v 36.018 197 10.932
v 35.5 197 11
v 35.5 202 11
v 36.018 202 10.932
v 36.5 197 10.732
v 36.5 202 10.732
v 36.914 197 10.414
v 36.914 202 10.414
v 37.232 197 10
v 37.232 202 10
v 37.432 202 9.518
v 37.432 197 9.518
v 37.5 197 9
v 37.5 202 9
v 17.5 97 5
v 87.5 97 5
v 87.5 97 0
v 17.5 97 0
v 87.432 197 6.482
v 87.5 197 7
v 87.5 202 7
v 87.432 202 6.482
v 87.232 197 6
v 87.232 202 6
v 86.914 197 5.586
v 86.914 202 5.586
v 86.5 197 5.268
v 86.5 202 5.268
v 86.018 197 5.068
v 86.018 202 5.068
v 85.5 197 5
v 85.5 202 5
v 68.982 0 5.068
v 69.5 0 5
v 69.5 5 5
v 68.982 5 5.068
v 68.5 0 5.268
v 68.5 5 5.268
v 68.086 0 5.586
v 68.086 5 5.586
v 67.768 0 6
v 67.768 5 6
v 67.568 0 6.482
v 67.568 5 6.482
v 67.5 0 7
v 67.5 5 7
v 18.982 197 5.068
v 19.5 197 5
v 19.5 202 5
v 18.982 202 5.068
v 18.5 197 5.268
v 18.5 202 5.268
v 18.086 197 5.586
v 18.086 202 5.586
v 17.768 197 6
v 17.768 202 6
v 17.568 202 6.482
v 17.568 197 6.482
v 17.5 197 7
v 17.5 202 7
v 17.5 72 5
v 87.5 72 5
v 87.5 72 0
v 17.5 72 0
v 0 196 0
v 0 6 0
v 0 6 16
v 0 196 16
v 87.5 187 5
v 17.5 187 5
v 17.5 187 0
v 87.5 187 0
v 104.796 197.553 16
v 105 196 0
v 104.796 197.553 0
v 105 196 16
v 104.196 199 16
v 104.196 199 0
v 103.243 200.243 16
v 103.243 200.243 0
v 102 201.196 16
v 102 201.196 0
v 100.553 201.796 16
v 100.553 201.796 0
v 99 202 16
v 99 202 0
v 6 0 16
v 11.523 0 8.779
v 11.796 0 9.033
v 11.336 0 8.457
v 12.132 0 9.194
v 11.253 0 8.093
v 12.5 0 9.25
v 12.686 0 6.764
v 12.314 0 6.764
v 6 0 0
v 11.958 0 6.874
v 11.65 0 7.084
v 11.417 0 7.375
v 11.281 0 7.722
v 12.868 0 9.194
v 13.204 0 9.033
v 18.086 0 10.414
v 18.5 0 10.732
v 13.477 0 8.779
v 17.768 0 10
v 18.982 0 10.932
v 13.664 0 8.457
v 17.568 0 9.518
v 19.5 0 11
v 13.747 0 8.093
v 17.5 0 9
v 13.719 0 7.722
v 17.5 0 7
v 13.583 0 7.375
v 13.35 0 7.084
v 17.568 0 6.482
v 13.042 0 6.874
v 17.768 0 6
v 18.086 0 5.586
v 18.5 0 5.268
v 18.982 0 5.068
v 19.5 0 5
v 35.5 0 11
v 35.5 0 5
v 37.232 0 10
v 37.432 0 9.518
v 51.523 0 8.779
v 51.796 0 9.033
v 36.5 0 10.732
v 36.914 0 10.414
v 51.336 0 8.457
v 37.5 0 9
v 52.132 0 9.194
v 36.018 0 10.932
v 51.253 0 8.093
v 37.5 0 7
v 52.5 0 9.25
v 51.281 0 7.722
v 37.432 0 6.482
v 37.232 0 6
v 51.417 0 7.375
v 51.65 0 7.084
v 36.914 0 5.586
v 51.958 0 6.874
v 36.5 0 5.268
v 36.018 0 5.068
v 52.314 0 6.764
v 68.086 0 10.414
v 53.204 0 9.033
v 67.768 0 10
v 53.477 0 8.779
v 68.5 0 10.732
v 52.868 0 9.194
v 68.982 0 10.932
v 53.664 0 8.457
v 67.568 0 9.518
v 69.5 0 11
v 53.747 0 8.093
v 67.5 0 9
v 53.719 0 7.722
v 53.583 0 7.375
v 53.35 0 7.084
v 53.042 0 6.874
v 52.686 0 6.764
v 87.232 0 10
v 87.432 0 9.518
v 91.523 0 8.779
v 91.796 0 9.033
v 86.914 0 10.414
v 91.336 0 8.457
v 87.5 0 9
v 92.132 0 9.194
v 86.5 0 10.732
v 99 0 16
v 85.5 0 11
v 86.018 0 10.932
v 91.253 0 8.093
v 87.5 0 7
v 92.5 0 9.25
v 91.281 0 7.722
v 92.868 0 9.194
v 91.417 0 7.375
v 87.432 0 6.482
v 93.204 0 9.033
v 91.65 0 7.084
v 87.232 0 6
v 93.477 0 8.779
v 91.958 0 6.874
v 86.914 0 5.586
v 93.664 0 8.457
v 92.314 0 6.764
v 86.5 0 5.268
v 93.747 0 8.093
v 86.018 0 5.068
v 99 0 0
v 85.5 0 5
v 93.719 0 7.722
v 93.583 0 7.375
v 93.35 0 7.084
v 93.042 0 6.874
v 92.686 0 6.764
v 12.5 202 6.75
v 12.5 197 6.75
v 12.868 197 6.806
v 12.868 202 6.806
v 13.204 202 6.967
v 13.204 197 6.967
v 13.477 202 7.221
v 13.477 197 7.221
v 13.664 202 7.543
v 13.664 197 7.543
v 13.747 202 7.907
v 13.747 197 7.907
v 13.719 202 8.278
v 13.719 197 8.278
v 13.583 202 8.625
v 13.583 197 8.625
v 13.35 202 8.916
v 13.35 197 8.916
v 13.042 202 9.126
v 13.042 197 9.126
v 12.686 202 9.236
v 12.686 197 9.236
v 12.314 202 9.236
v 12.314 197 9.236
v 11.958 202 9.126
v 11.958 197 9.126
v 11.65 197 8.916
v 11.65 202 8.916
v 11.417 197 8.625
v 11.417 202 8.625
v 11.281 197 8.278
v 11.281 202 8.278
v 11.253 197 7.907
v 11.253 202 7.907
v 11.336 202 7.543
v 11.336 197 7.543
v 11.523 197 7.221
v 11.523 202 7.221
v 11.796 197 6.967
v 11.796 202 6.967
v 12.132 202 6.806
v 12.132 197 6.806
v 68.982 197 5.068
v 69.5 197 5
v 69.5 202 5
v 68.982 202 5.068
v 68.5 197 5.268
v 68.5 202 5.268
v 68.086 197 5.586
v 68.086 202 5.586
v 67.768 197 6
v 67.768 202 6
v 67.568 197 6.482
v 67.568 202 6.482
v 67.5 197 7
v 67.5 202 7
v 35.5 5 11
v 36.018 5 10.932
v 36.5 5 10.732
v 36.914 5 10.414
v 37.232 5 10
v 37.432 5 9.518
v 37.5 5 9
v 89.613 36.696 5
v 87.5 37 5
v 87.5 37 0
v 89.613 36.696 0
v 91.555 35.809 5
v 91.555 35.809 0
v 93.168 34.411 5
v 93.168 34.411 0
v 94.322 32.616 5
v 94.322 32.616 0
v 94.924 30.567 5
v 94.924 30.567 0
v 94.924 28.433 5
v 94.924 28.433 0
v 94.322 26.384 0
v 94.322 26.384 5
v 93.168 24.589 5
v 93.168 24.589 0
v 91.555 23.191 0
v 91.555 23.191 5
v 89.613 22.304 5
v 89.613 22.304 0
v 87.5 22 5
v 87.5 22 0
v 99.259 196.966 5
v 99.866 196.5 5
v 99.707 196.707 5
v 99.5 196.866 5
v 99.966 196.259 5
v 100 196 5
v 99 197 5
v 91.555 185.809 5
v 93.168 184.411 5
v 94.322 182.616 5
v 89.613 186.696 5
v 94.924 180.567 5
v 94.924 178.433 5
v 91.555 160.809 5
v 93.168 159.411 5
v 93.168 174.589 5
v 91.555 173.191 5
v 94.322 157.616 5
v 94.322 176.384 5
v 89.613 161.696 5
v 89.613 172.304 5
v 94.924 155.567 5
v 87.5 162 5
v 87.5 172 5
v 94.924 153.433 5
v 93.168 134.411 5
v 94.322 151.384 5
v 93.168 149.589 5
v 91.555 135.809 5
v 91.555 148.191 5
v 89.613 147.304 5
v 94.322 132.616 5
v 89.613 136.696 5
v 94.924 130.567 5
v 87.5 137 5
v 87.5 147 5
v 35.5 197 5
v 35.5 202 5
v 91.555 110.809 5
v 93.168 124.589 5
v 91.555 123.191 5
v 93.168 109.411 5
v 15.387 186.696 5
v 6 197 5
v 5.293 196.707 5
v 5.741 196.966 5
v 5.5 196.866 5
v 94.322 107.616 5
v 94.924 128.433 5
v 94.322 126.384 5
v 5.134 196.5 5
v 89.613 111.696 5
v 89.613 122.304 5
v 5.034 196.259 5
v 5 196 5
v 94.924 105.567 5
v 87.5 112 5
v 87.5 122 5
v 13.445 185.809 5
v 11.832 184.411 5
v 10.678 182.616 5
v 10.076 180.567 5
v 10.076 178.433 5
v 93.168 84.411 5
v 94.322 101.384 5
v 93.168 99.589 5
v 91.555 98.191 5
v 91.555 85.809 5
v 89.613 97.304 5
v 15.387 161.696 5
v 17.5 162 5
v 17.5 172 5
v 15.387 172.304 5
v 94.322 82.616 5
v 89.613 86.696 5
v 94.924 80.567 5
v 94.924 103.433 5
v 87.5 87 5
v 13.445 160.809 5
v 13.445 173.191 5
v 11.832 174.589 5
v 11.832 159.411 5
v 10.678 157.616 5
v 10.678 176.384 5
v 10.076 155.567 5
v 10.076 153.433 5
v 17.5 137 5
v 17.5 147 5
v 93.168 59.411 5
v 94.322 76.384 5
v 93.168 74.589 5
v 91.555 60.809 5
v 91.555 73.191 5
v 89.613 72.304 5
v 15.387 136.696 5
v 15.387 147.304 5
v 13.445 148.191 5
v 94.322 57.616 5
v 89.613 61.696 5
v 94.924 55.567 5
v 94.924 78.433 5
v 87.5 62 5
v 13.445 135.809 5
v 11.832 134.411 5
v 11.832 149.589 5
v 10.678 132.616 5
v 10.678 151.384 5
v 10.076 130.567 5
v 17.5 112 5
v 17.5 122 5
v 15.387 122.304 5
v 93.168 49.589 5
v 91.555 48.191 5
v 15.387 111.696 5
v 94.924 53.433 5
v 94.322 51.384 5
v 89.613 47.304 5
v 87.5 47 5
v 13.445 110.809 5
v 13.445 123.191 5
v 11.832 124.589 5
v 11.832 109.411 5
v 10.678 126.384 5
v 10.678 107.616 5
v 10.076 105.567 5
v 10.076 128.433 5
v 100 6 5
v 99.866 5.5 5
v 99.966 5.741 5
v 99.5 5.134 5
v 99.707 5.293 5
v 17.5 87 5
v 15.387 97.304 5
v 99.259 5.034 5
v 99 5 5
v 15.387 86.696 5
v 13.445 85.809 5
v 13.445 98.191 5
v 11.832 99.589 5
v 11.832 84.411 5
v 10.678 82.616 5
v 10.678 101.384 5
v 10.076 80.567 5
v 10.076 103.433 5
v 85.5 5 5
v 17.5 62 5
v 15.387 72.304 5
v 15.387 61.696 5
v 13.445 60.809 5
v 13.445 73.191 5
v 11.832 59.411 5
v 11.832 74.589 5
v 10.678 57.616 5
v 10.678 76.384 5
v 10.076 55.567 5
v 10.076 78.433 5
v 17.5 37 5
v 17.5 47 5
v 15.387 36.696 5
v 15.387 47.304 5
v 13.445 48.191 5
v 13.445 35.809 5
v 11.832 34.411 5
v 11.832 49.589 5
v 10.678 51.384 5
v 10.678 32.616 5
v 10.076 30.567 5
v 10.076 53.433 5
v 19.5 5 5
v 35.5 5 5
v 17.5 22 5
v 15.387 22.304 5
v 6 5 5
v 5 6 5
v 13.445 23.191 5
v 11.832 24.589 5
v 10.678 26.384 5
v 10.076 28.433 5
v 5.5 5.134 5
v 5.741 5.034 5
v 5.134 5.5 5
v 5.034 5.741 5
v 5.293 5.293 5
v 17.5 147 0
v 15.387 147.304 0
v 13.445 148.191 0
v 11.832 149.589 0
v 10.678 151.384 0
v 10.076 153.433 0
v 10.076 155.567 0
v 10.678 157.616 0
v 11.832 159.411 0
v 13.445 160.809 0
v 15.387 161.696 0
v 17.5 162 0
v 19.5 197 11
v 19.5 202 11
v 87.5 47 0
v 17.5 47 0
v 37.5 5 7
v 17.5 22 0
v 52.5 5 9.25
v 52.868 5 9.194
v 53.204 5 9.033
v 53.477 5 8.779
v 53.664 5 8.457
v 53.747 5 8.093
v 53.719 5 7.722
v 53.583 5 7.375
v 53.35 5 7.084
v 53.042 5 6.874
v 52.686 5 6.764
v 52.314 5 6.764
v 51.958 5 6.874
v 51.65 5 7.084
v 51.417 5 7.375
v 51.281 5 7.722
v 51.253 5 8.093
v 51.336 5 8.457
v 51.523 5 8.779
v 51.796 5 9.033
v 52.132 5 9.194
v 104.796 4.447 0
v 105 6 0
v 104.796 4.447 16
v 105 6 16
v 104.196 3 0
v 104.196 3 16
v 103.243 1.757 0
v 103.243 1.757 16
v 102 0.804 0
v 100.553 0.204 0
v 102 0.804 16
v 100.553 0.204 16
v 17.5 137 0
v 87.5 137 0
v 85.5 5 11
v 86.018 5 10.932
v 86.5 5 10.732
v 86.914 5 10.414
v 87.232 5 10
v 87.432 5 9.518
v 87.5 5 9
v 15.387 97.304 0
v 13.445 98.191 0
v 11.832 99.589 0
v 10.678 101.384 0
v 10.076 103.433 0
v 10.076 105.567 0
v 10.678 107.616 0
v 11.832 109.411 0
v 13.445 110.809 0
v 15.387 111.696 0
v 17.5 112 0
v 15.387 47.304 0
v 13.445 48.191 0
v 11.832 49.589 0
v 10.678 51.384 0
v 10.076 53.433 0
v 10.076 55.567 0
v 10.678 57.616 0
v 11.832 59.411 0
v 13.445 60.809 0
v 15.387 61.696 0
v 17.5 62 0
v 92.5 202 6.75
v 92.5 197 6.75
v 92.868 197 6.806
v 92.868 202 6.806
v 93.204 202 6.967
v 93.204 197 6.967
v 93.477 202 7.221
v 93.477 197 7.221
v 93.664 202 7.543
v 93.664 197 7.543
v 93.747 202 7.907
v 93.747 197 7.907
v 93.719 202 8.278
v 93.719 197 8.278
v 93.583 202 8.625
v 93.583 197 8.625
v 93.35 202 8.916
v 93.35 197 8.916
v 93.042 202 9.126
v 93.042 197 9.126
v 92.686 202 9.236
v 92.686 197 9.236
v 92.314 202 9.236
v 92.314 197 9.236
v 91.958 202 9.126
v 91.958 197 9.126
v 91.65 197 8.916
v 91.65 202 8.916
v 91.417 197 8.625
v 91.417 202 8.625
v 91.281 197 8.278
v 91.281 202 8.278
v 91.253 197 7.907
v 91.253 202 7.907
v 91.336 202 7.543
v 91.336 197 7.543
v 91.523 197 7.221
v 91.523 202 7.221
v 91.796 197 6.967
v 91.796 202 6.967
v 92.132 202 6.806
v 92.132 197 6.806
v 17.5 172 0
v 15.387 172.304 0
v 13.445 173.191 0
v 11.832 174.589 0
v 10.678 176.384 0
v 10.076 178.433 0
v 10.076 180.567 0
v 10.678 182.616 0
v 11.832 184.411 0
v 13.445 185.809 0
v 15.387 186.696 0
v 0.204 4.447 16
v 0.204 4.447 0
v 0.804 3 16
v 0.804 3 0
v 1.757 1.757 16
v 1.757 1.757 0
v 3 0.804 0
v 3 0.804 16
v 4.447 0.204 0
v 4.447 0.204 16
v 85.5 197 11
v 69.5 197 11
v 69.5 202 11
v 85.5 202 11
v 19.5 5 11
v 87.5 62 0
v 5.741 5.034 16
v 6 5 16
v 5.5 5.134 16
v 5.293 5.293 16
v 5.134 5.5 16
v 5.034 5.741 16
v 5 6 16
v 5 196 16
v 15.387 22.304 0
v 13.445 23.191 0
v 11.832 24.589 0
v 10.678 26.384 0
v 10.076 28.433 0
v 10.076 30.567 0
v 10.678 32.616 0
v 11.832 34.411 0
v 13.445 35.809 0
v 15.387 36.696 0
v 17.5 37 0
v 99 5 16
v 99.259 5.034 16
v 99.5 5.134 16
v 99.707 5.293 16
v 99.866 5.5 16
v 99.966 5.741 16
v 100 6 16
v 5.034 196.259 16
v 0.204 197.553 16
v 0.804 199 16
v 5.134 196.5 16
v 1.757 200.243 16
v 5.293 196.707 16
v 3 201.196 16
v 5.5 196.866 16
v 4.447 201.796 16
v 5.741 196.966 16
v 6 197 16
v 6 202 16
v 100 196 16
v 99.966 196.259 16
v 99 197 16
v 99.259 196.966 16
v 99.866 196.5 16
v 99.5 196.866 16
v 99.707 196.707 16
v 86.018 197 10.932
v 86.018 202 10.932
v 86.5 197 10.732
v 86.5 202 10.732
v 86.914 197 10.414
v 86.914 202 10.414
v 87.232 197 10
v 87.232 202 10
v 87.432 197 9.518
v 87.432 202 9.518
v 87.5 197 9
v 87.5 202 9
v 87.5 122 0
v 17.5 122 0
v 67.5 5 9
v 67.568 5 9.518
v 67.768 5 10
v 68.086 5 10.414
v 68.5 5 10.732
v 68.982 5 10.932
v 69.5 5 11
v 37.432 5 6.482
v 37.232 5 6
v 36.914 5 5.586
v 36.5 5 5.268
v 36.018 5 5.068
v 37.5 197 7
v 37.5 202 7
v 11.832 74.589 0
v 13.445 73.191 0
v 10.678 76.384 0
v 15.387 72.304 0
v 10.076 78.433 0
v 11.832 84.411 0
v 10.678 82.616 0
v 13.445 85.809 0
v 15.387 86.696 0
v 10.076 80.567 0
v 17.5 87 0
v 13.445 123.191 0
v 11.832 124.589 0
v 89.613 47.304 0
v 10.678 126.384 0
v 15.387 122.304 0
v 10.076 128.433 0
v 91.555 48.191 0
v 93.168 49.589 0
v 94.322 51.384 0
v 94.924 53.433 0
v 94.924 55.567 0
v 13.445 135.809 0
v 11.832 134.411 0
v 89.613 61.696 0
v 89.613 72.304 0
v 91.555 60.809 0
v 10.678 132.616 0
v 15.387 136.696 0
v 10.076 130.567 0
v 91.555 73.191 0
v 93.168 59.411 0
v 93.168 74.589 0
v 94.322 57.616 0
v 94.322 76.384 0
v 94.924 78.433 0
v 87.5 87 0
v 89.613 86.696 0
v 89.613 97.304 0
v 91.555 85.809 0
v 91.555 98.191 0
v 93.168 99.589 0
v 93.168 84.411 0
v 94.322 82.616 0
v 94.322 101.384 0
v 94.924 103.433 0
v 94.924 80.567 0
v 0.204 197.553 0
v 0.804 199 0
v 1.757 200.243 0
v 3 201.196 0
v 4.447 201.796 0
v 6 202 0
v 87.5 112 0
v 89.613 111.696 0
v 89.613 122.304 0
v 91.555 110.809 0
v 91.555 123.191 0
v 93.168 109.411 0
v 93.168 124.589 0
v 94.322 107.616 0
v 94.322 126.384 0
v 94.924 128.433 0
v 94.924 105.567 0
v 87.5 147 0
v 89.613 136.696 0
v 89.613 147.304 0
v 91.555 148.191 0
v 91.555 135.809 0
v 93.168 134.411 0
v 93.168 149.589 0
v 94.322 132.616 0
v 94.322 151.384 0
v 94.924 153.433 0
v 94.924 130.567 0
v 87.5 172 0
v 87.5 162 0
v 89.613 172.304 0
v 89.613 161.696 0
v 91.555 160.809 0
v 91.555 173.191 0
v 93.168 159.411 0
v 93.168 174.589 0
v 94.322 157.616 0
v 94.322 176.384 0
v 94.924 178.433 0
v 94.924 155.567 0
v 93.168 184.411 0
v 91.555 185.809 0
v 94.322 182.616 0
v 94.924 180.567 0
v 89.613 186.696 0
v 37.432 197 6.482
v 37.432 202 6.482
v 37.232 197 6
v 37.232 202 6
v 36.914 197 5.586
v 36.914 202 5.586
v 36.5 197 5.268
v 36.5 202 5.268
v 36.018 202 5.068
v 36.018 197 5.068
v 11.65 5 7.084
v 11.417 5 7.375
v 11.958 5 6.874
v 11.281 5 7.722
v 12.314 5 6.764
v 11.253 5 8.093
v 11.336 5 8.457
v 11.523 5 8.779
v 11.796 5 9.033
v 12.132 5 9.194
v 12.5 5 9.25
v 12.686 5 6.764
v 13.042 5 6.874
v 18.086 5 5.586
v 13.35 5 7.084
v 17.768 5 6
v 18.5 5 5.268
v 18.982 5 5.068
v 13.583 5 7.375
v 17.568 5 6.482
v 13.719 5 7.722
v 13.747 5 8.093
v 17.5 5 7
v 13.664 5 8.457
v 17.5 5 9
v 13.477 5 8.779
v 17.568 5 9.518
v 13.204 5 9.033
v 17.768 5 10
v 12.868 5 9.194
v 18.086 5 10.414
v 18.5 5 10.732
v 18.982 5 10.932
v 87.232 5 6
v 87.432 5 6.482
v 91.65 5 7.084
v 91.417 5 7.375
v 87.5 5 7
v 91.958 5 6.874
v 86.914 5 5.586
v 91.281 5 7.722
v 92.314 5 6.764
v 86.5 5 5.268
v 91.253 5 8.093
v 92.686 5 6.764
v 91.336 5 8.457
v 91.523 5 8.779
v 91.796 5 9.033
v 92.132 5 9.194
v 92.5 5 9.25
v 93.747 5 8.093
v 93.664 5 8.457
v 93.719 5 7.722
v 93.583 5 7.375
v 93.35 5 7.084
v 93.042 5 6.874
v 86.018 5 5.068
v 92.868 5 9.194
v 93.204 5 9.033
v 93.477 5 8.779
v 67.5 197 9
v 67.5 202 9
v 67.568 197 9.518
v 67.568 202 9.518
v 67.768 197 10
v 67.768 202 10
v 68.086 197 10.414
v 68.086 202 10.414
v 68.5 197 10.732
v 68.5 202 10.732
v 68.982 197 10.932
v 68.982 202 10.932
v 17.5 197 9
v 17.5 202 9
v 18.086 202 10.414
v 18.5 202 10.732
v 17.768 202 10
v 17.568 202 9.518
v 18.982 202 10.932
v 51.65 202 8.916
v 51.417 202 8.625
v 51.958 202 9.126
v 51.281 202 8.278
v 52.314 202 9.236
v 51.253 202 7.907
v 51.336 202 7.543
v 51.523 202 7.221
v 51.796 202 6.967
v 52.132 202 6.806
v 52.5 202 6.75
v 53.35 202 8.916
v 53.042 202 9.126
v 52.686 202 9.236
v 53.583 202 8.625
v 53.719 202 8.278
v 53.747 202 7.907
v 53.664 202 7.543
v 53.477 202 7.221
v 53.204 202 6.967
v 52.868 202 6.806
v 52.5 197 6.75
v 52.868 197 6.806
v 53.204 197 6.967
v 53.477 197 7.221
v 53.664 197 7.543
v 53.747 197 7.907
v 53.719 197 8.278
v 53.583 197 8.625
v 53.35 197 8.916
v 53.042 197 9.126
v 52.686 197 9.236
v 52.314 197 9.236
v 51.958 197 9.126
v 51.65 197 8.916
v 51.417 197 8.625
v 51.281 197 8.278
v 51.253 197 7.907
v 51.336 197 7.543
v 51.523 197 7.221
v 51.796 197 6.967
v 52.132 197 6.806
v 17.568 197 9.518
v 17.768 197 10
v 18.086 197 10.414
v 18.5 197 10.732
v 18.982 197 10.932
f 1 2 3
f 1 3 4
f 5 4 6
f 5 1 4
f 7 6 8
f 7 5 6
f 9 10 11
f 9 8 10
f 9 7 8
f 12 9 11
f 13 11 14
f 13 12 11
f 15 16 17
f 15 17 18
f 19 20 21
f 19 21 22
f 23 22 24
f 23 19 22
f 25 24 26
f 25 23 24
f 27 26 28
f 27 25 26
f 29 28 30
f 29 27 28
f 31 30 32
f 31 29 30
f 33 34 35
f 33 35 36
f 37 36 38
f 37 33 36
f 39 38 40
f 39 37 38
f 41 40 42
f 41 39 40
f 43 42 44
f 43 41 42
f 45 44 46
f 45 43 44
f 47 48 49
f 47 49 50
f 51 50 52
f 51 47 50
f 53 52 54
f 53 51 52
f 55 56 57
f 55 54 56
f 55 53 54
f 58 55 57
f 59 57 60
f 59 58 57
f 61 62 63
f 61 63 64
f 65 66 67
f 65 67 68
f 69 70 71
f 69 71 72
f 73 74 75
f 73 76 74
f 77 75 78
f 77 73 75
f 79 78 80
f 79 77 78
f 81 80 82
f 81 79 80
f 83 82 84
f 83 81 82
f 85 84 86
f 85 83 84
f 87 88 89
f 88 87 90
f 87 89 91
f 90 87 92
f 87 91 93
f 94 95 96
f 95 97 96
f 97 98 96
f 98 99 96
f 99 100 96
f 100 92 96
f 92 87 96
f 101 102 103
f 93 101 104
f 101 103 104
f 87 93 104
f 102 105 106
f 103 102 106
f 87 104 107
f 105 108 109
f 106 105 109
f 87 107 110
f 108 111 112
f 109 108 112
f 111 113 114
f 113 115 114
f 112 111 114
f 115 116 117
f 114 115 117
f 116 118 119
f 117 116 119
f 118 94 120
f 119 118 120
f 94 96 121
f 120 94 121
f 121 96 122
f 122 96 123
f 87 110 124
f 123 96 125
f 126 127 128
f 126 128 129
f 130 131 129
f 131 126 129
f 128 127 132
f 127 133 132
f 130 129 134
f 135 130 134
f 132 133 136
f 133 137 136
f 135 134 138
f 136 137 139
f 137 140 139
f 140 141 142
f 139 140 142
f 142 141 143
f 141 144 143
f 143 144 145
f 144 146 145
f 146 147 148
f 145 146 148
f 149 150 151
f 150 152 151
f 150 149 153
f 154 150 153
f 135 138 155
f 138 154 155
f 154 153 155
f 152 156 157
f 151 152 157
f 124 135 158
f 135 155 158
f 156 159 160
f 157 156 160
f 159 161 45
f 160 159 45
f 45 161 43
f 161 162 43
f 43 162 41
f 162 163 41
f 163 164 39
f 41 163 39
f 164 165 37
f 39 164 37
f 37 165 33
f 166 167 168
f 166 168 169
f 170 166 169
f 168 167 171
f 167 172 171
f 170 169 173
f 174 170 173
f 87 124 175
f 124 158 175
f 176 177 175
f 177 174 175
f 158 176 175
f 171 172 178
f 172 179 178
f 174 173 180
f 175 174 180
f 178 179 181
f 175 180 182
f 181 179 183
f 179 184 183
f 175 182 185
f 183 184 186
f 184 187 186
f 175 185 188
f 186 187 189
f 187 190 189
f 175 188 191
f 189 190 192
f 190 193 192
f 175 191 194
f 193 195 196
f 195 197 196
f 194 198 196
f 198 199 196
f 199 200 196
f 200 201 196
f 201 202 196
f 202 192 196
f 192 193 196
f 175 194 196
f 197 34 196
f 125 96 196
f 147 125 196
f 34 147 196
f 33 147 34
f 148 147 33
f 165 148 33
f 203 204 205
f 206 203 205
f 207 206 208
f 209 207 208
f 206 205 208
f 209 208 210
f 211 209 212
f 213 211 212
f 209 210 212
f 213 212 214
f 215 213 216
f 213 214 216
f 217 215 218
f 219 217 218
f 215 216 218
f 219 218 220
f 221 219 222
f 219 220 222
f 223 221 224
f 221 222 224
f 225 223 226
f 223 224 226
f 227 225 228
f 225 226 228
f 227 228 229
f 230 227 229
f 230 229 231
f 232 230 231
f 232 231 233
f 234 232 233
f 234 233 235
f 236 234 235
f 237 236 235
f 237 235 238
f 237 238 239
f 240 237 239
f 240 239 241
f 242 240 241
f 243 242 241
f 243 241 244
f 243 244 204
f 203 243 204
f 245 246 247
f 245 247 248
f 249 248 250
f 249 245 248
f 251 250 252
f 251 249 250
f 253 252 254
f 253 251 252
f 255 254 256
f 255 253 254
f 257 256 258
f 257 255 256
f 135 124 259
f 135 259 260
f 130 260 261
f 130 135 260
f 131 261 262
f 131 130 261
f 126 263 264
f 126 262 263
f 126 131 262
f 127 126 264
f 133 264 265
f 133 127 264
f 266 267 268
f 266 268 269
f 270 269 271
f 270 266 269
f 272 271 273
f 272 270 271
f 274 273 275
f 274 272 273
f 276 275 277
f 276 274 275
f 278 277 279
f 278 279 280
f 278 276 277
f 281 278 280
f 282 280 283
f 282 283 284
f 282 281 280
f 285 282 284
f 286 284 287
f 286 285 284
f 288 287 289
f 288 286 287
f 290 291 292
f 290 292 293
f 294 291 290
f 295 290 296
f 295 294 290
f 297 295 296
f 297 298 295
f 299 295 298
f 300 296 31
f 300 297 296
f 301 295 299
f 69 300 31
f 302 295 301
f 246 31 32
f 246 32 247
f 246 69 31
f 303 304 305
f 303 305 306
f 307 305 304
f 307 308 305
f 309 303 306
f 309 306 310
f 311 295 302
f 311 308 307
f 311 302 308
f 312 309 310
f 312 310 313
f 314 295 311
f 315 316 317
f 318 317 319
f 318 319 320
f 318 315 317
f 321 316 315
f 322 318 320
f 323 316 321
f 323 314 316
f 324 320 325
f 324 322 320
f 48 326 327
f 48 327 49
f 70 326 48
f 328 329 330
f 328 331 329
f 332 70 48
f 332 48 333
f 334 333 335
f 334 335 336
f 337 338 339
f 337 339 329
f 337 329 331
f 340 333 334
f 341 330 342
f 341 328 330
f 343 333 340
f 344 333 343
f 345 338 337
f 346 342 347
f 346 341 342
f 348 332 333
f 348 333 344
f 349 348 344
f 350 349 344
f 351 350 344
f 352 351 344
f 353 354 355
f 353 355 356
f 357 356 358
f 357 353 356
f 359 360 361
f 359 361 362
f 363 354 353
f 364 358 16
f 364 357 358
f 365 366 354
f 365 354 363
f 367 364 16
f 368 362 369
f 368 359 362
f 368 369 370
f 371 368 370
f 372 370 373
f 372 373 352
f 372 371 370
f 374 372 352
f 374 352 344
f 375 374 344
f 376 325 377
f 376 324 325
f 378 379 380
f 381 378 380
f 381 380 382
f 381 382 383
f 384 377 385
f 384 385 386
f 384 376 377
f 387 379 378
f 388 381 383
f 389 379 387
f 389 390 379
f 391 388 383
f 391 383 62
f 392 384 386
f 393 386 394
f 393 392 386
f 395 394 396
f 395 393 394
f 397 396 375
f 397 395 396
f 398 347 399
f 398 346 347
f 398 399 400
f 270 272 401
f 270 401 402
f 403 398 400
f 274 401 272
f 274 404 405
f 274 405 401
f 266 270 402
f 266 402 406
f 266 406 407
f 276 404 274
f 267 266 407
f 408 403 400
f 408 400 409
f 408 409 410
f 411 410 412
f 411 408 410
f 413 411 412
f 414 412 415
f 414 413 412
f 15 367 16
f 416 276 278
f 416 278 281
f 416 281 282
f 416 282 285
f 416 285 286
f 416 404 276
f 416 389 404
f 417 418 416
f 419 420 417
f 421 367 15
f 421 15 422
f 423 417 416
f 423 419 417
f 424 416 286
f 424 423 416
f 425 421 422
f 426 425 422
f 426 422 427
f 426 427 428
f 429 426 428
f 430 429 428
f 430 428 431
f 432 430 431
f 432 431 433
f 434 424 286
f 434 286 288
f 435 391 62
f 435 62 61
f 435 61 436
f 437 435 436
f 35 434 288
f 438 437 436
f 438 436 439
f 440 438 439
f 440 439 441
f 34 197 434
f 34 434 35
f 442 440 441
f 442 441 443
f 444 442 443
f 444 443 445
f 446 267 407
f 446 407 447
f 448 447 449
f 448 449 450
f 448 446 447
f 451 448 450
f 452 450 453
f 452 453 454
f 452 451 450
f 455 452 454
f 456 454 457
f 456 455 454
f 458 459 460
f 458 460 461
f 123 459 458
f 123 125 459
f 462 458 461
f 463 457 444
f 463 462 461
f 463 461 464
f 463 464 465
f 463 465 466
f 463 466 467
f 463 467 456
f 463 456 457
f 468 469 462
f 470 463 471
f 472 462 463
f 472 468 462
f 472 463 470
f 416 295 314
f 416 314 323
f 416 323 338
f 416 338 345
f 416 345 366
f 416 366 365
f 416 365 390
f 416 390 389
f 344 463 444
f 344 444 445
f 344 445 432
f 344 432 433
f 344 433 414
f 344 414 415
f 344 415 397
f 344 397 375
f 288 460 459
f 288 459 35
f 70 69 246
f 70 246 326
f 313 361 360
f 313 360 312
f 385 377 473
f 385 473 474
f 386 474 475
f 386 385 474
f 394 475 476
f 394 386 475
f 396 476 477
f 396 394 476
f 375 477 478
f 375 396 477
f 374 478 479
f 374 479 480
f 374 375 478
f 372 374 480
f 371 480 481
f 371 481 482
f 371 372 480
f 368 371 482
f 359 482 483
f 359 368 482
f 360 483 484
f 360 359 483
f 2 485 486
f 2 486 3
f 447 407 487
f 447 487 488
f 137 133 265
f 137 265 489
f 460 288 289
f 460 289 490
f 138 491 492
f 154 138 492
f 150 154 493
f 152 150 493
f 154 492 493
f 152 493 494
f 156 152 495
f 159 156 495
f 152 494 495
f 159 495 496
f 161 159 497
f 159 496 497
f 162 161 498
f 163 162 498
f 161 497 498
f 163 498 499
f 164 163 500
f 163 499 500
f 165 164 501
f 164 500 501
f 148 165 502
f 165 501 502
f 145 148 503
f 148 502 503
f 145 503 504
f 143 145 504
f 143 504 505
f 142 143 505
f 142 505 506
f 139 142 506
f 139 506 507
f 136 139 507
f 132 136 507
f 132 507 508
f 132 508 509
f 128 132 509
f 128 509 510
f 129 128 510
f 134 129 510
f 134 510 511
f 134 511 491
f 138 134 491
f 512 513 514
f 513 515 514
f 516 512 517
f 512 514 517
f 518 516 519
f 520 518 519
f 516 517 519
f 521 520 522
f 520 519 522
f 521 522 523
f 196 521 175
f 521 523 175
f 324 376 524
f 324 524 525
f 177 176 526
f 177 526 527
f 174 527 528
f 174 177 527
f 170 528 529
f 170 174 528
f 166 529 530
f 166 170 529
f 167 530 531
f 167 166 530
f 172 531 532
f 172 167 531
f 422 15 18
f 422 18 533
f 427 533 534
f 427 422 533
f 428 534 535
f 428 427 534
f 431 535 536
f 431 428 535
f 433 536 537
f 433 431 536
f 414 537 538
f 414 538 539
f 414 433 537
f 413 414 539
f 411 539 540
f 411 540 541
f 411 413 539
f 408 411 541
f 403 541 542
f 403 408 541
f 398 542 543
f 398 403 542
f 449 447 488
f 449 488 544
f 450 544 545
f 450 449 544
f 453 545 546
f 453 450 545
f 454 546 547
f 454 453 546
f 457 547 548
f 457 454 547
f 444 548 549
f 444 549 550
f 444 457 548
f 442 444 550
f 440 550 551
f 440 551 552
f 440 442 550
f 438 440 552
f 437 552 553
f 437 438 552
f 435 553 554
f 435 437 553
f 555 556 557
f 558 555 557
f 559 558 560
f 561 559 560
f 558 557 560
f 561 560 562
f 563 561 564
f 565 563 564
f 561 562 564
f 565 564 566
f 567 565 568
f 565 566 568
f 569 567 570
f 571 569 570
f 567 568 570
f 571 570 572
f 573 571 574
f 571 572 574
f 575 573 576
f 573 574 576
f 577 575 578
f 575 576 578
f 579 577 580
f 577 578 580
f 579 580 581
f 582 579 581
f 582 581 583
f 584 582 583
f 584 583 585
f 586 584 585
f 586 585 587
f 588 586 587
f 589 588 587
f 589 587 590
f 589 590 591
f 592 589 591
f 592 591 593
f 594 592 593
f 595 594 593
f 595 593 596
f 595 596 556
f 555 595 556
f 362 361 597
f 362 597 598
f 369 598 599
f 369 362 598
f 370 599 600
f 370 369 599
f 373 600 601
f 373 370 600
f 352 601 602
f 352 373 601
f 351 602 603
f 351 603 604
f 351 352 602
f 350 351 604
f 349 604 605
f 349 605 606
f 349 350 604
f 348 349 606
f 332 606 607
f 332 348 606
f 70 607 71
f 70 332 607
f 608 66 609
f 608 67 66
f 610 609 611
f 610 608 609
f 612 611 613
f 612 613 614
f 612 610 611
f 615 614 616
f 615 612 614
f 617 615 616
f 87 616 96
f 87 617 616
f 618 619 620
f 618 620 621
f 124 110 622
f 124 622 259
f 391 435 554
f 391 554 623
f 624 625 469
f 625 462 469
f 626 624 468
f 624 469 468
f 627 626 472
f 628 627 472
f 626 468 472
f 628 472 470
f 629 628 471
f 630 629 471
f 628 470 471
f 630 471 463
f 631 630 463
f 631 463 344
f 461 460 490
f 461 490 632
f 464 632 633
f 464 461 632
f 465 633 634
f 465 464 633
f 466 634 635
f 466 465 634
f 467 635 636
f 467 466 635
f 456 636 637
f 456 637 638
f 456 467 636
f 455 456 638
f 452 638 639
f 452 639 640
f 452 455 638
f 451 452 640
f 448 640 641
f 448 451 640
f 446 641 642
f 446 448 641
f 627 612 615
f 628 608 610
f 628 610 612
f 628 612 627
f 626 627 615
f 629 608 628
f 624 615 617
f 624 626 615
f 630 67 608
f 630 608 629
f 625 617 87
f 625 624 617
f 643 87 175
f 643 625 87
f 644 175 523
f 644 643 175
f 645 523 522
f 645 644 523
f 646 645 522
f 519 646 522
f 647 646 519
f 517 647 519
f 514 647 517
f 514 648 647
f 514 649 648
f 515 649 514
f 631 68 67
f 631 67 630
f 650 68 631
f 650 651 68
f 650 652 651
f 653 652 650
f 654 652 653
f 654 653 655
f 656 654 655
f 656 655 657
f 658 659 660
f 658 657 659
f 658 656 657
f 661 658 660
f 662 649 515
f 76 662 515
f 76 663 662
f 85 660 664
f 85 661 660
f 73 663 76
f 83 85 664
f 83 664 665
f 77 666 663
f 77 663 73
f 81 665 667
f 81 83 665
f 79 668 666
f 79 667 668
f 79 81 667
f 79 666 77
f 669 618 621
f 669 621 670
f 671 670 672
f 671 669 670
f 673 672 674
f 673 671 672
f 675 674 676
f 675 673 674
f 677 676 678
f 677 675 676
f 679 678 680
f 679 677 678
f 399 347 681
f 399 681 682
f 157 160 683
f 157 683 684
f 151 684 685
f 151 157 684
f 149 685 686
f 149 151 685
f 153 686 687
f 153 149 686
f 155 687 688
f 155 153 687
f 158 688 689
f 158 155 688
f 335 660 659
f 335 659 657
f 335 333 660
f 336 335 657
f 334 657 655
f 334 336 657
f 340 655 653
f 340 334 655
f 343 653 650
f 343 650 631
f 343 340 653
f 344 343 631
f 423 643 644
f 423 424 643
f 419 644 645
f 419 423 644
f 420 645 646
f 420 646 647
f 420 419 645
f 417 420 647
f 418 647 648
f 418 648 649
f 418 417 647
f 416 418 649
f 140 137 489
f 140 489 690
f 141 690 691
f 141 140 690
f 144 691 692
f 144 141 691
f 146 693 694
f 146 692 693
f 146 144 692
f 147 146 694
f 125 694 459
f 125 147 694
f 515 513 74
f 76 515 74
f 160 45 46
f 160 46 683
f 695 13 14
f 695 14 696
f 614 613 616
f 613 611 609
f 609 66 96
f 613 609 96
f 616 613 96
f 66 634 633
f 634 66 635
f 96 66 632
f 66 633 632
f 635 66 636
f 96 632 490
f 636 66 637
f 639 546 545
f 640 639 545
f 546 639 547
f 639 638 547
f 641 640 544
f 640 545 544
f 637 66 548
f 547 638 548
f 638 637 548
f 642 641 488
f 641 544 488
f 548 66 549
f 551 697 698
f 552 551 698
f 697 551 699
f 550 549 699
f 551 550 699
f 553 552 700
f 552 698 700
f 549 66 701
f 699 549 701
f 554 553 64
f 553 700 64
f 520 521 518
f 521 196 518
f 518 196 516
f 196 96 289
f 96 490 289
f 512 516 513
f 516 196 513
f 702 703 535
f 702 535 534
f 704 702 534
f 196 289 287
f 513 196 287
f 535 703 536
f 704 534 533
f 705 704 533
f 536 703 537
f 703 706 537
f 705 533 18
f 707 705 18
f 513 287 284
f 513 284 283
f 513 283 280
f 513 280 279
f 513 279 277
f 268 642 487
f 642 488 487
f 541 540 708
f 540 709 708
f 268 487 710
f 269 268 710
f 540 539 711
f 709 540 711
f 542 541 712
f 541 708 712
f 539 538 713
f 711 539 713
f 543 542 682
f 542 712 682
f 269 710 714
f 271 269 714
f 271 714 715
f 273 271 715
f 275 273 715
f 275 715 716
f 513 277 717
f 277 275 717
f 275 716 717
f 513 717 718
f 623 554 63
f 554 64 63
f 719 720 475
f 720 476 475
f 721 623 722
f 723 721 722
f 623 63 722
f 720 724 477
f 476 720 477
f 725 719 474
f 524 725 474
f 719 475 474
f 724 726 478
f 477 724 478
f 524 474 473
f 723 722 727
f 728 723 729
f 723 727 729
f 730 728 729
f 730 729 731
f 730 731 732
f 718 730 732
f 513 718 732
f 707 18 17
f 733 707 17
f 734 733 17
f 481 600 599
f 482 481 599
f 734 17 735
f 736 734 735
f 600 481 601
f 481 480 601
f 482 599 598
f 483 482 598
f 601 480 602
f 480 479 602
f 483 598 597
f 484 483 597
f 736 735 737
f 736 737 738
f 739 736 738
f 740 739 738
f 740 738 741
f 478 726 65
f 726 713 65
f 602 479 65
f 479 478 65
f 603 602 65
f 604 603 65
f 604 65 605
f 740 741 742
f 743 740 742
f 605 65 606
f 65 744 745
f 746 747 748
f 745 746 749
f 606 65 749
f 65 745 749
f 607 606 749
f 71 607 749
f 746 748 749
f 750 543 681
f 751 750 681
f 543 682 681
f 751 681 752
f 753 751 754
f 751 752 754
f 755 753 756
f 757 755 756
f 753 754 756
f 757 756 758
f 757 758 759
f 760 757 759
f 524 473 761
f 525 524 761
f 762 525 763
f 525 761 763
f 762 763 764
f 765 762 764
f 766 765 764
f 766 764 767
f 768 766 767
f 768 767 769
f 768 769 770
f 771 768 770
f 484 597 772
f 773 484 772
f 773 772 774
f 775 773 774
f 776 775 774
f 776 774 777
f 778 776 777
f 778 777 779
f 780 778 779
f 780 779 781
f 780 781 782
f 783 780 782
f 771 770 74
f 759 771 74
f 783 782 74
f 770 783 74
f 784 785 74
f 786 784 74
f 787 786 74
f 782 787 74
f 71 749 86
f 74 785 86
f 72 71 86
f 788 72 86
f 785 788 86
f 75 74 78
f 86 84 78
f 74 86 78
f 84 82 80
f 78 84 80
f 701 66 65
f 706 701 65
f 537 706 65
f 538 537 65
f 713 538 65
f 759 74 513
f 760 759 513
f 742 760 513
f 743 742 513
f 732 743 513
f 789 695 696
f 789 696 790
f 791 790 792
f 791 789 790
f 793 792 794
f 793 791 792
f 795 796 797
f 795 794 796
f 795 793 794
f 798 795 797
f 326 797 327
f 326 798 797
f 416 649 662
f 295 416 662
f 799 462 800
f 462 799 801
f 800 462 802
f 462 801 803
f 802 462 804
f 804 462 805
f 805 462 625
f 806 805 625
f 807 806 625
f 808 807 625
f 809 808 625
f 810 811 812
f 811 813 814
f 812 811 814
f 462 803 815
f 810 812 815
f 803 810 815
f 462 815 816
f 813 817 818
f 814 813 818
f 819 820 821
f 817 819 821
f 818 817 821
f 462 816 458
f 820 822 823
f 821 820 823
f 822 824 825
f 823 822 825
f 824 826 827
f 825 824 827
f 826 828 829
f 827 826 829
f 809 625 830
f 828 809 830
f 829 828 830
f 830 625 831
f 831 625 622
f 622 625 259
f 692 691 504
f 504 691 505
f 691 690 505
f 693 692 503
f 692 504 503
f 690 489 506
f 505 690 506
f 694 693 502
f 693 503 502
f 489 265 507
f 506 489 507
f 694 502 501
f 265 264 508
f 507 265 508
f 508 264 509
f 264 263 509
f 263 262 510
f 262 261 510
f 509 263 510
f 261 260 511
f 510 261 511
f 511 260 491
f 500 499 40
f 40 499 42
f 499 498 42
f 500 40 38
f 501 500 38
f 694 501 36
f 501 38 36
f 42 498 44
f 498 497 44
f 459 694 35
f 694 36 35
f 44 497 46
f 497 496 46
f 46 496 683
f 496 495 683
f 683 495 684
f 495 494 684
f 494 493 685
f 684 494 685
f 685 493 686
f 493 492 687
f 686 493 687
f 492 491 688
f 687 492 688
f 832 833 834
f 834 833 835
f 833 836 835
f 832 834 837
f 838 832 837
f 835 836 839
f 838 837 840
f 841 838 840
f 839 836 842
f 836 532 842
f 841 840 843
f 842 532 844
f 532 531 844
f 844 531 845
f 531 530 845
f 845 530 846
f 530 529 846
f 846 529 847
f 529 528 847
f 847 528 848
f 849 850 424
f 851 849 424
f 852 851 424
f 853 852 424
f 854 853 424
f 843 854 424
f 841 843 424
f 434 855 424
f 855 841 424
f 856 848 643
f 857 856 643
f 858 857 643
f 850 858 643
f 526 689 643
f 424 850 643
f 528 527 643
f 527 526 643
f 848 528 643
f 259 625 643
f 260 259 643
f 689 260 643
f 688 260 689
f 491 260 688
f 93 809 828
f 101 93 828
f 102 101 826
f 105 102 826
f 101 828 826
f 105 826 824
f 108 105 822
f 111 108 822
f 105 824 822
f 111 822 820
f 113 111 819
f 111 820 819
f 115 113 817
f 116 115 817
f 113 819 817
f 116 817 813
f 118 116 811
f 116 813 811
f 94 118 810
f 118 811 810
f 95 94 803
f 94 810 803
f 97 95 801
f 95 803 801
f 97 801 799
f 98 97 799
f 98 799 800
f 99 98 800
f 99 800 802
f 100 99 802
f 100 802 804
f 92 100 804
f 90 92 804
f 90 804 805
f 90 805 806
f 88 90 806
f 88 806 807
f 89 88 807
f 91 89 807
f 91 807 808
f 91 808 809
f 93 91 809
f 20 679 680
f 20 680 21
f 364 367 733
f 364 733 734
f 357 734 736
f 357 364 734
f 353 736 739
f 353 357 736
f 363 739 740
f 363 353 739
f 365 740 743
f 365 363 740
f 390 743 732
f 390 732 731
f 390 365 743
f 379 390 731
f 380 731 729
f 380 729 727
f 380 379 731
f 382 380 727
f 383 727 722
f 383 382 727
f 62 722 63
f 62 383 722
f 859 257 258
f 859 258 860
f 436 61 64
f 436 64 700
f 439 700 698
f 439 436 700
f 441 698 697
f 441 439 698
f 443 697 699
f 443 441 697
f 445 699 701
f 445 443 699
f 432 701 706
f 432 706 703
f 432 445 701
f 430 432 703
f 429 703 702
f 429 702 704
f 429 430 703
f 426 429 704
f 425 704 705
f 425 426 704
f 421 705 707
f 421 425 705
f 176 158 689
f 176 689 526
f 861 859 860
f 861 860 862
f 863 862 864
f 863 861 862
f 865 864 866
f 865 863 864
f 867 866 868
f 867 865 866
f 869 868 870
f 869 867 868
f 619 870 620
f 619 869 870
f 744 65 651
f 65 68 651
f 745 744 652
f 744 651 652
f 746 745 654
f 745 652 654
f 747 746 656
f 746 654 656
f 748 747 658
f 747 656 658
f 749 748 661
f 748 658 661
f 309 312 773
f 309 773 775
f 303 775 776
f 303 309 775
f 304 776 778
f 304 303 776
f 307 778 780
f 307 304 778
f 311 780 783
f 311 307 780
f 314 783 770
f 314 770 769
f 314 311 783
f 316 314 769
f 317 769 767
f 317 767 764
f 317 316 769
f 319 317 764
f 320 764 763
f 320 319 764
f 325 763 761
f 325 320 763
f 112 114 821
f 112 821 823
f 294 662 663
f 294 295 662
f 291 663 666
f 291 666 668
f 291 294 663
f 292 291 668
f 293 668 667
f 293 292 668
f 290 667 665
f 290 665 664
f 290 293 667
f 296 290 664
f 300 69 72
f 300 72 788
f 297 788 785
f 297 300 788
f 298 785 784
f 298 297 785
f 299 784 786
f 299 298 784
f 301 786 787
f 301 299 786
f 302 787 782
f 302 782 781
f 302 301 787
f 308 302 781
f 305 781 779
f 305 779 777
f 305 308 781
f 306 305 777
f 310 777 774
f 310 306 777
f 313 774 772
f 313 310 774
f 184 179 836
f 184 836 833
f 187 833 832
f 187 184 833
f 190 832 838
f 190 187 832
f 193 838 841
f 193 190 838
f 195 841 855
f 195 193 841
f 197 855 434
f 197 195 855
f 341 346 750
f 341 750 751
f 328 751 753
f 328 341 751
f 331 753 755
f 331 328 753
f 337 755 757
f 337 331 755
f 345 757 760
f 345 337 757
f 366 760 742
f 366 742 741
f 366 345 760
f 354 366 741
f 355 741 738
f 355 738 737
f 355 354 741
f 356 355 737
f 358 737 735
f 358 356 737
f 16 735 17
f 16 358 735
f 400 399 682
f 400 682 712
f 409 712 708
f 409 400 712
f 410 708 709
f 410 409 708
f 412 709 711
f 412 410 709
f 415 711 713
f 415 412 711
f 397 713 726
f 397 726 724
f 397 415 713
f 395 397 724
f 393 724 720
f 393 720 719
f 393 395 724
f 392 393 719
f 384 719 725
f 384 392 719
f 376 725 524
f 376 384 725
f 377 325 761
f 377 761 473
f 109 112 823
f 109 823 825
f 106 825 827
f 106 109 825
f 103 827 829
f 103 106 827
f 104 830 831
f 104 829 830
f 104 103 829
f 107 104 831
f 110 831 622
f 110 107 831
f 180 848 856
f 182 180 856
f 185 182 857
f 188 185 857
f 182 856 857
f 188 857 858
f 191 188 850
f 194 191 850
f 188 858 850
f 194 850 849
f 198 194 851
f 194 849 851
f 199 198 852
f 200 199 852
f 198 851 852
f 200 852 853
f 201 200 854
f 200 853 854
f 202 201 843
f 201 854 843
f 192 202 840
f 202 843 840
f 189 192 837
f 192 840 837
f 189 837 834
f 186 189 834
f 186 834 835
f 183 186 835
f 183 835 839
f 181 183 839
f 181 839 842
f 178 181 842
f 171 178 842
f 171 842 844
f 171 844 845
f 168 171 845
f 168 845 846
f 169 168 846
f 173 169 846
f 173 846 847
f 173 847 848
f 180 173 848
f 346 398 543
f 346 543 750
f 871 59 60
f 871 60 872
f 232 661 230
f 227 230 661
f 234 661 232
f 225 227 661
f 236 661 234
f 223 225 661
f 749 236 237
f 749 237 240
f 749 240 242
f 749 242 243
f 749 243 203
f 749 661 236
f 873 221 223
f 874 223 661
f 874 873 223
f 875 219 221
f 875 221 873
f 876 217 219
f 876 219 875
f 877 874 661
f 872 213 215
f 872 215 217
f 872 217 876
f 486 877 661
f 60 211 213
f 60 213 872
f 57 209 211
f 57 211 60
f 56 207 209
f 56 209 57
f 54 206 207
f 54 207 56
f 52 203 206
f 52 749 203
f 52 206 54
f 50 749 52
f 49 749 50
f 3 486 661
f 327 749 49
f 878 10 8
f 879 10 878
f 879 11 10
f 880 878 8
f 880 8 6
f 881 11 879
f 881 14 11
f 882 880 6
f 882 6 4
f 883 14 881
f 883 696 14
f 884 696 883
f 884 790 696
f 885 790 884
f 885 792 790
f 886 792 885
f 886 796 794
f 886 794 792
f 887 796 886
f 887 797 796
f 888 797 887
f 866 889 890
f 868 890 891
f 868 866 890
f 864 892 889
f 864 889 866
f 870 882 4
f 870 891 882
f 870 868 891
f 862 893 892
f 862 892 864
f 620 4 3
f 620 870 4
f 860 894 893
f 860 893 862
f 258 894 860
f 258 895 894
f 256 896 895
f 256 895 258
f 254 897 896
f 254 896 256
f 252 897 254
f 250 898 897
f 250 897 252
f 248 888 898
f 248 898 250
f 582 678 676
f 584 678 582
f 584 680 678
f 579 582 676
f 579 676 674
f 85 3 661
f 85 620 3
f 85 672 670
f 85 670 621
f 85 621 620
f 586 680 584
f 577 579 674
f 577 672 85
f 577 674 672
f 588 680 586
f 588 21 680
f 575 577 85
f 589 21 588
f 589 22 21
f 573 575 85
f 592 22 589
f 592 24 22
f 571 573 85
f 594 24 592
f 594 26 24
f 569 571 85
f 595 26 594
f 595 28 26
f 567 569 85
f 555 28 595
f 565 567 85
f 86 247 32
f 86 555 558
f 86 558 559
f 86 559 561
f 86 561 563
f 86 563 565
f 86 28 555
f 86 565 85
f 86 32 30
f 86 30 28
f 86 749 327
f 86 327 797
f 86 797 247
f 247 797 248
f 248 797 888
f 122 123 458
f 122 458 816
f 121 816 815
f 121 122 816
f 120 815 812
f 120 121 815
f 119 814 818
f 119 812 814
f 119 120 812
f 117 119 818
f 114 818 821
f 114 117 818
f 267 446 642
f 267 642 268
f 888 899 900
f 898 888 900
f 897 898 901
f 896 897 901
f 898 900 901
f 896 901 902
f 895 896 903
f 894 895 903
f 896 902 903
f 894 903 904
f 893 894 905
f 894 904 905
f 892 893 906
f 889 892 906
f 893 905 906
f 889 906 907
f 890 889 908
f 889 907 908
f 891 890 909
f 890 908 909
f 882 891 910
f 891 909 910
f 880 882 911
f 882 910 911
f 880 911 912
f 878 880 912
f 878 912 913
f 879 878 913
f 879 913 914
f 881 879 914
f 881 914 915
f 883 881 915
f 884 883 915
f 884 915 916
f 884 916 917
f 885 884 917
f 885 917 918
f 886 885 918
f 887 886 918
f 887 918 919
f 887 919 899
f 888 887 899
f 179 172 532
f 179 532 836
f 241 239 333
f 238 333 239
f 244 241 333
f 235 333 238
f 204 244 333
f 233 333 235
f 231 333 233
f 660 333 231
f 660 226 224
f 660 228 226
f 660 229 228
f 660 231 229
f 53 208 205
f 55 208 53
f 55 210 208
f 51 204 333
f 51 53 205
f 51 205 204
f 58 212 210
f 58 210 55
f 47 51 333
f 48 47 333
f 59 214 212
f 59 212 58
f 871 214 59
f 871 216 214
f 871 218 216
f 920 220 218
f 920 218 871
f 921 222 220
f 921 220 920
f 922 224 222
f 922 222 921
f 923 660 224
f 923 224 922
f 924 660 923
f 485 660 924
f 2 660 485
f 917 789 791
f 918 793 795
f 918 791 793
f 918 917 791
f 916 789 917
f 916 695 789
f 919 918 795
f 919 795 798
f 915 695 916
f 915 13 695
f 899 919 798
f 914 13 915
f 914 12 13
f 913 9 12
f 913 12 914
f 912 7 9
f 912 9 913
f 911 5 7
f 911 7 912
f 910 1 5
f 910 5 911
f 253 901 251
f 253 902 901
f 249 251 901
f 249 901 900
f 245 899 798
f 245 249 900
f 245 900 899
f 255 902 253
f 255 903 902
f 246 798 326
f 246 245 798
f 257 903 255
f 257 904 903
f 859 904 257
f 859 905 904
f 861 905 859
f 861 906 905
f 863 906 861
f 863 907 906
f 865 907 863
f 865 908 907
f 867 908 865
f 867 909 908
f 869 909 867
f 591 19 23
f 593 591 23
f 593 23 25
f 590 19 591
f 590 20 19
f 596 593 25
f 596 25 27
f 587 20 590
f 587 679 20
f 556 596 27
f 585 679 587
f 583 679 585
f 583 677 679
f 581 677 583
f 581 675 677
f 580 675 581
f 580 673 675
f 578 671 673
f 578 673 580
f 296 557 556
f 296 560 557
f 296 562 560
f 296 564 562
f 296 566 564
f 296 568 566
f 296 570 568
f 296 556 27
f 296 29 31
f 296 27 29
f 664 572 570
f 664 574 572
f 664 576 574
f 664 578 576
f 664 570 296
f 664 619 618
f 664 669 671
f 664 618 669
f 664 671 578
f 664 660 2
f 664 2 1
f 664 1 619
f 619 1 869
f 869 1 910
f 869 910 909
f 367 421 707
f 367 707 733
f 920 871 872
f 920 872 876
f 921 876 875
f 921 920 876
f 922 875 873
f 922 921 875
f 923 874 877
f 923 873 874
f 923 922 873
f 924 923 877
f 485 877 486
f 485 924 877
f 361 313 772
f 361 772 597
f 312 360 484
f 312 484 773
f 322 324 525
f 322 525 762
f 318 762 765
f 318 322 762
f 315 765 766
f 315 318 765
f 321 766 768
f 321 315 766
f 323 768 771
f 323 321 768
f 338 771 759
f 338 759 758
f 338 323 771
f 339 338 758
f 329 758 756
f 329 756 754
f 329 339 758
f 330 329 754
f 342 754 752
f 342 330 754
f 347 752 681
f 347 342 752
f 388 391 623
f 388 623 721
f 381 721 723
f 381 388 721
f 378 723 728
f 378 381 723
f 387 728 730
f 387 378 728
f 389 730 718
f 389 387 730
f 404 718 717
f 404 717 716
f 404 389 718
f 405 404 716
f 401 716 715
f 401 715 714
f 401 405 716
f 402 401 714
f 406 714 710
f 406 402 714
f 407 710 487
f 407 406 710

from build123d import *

# Parameters (mm, degrees)
SKETCH1_W             = 105
SKETCH1_H             = 202
BOSS_EXTRUDE1_DEPTH   = 16
SKETCH2_W             = 95
SKETCH2_H             = 192
CUT_EXTRUDE1_DEPTH    = 11
CUT_EXTRUDE2_DEPTH    = 5
LPATTERN1_COUNT       = 7
LPATTERN1_PITCH       = 25
CUT_EXTRUDE4_DEPTH    = 287
FILLET1_R             = 6
FILLET2_R             = 1
M3_TAPPED_HOLE1_D     = 2.5
M3_TAPPED_HOLE1_DEPTH = 7.5
M3_TAPPED_HOLE1_TIP   = 0.751075774
M3_TAPPED_HOLE2_D     = 2.5
M3_TAPPED_HOLE2_DEPTH = 7.5
M3_TAPPED_HOLE2_TIP   = 0.751075774


with BuildPart() as part:
    # Sketch1 → Boss-Extrude1 (new body)
    with BuildSketch(Plane.XY):
        with Locations((52.5, 101)):
            Rectangle(SKETCH1_W, SKETCH1_H)
    extrude(amount=BOSS_EXTRUDE1_DEPTH)

    # Sketch2 → Cut-Extrude1 (cut)
    with BuildSketch(Plane.XY.offset(16)):
        with Locations((52.5, 101)):
            Rectangle(SKETCH2_W, SKETCH2_H)
    extrude(amount=-CUT_EXTRUDE1_DEPTH, mode=Mode.SUBTRACT)

    # Sketch3 → Cut-Extrude2 (cut)
    with BuildSketch(Plane.XY.offset(5)):
        with BuildLine():
            Line((17.5, 187), (87.5, 187))
            ThreePointArc((87.5, 187), (95, 179.5), (87.5, 172))
            Line((87.5, 172), (17.5, 172))
            ThreePointArc((17.5, 172), (10, 179.5), (17.5, 187))
        make_face()
    cut_extrude2 = extrude(amount=-CUT_EXTRUDE2_DEPTH, mode=Mode.SUBTRACT)

    # LPattern1: Cut-Extrude2 ×7
    with Locations(*[(0, -i * LPATTERN1_PITCH, 0) for i in range(1, LPATTERN1_COUNT)]):
        add(cut_extrude2, mode=Mode.SUBTRACT)

    # Sketch5 → Cut-Extrude4 (cut)
    with BuildSketch(Plane.XZ):
        with BuildLine():
            Line((17.5, 7), (17.5, 9))
            ThreePointArc((17.5, 9), (18.085786438, 10.414213562), (19.5, 11))
            Line((19.5, 11), (35.5, 11))
            ThreePointArc((35.5, 11), (36.914213562, 10.414213562), (37.5, 9))
            Line((37.5, 9), (37.5, 7))
            ThreePointArc((37.5, 7), (36.914213562, 5.585786438), (35.5, 5))
            Line((35.5, 5), (19.5, 5))
            ThreePointArc((19.5, 5), (18.085786438, 5.585786438), (17.5, 7))
        make_face()
        with BuildLine():
            Line((87.5, 9), (87.5, 7))
            ThreePointArc((87.5, 7), (86.914213562, 5.585786438), (85.5, 5))
            Line((85.5, 5), (69.5, 5))
            ThreePointArc((69.5, 5), (68.085786438, 5.585786438), (67.5, 7))
            Line((67.5, 7), (67.5, 9))
            ThreePointArc((67.5, 9), (68.085786438, 10.414213562), (69.5, 11))
            Line((69.5, 11), (85.5, 11))
            ThreePointArc((85.5, 11), (86.914213562, 10.414213562), (87.5, 9))
        make_face()
    extrude(amount=-CUT_EXTRUDE4_DEPTH, mode=Mode.SUBTRACT)

    # Fillet1
    fillet1_edges = [part.edges().sort_by_distance(p)[0] for p in [
        (0, 202, 8),
        (105, 202, 8),
        (105, 0, 8),
        (0, 0, 8),
    ]]
    fillet(fillet1_edges, radius=FILLET1_R)

    # Fillet2
    fillet2_edges = [part.edges().sort_by_distance(p)[0] for p in [
        (100, 197, 10.5),
        (5, 197, 10.5),
        (5, 5, 10.5),
        (100, 5, 10.5),
    ]]
    fillet(fillet2_edges, radius=FILLET2_R)

    # M3 Tapped Hole1
    with Locations(Plane(origin=(92.5, 202, 8), x_dir=(0, 0, 1), z_dir=(0, 1, 0))):
        with Locations((0, 0), (0, -40), (0, -80)):
            Hole(M3_TAPPED_HOLE1_D / 2, depth=M3_TAPPED_HOLE1_DEPTH)
            with Locations((0, 0, -(M3_TAPPED_HOLE1_DEPTH + M3_TAPPED_HOLE1_TIP / 2))):  # 118° drill point
                Cone(0, M3_TAPPED_HOLE1_D / 2, M3_TAPPED_HOLE1_TIP, mode=Mode.SUBTRACT)

    # M3 Tapped Hole2
    with Locations(Plane(origin=(12.5, 0, 8), x_dir=(0, 0, -1), z_dir=(0, -1, 0))):
        with Locations((0, 0), (0, 40), (0, 80)):
            Hole(M3_TAPPED_HOLE2_D / 2, depth=M3_TAPPED_HOLE2_DEPTH)
            with Locations((0, 0, -(M3_TAPPED_HOLE2_DEPTH + M3_TAPPED_HOLE2_TIP / 2))):  # 118° drill point
                Cone(0, M3_TAPPED_HOLE2_D / 2, M3_TAPPED_HOLE2_TIP, mode=Mode.SUBTRACT)


solid = part.part
